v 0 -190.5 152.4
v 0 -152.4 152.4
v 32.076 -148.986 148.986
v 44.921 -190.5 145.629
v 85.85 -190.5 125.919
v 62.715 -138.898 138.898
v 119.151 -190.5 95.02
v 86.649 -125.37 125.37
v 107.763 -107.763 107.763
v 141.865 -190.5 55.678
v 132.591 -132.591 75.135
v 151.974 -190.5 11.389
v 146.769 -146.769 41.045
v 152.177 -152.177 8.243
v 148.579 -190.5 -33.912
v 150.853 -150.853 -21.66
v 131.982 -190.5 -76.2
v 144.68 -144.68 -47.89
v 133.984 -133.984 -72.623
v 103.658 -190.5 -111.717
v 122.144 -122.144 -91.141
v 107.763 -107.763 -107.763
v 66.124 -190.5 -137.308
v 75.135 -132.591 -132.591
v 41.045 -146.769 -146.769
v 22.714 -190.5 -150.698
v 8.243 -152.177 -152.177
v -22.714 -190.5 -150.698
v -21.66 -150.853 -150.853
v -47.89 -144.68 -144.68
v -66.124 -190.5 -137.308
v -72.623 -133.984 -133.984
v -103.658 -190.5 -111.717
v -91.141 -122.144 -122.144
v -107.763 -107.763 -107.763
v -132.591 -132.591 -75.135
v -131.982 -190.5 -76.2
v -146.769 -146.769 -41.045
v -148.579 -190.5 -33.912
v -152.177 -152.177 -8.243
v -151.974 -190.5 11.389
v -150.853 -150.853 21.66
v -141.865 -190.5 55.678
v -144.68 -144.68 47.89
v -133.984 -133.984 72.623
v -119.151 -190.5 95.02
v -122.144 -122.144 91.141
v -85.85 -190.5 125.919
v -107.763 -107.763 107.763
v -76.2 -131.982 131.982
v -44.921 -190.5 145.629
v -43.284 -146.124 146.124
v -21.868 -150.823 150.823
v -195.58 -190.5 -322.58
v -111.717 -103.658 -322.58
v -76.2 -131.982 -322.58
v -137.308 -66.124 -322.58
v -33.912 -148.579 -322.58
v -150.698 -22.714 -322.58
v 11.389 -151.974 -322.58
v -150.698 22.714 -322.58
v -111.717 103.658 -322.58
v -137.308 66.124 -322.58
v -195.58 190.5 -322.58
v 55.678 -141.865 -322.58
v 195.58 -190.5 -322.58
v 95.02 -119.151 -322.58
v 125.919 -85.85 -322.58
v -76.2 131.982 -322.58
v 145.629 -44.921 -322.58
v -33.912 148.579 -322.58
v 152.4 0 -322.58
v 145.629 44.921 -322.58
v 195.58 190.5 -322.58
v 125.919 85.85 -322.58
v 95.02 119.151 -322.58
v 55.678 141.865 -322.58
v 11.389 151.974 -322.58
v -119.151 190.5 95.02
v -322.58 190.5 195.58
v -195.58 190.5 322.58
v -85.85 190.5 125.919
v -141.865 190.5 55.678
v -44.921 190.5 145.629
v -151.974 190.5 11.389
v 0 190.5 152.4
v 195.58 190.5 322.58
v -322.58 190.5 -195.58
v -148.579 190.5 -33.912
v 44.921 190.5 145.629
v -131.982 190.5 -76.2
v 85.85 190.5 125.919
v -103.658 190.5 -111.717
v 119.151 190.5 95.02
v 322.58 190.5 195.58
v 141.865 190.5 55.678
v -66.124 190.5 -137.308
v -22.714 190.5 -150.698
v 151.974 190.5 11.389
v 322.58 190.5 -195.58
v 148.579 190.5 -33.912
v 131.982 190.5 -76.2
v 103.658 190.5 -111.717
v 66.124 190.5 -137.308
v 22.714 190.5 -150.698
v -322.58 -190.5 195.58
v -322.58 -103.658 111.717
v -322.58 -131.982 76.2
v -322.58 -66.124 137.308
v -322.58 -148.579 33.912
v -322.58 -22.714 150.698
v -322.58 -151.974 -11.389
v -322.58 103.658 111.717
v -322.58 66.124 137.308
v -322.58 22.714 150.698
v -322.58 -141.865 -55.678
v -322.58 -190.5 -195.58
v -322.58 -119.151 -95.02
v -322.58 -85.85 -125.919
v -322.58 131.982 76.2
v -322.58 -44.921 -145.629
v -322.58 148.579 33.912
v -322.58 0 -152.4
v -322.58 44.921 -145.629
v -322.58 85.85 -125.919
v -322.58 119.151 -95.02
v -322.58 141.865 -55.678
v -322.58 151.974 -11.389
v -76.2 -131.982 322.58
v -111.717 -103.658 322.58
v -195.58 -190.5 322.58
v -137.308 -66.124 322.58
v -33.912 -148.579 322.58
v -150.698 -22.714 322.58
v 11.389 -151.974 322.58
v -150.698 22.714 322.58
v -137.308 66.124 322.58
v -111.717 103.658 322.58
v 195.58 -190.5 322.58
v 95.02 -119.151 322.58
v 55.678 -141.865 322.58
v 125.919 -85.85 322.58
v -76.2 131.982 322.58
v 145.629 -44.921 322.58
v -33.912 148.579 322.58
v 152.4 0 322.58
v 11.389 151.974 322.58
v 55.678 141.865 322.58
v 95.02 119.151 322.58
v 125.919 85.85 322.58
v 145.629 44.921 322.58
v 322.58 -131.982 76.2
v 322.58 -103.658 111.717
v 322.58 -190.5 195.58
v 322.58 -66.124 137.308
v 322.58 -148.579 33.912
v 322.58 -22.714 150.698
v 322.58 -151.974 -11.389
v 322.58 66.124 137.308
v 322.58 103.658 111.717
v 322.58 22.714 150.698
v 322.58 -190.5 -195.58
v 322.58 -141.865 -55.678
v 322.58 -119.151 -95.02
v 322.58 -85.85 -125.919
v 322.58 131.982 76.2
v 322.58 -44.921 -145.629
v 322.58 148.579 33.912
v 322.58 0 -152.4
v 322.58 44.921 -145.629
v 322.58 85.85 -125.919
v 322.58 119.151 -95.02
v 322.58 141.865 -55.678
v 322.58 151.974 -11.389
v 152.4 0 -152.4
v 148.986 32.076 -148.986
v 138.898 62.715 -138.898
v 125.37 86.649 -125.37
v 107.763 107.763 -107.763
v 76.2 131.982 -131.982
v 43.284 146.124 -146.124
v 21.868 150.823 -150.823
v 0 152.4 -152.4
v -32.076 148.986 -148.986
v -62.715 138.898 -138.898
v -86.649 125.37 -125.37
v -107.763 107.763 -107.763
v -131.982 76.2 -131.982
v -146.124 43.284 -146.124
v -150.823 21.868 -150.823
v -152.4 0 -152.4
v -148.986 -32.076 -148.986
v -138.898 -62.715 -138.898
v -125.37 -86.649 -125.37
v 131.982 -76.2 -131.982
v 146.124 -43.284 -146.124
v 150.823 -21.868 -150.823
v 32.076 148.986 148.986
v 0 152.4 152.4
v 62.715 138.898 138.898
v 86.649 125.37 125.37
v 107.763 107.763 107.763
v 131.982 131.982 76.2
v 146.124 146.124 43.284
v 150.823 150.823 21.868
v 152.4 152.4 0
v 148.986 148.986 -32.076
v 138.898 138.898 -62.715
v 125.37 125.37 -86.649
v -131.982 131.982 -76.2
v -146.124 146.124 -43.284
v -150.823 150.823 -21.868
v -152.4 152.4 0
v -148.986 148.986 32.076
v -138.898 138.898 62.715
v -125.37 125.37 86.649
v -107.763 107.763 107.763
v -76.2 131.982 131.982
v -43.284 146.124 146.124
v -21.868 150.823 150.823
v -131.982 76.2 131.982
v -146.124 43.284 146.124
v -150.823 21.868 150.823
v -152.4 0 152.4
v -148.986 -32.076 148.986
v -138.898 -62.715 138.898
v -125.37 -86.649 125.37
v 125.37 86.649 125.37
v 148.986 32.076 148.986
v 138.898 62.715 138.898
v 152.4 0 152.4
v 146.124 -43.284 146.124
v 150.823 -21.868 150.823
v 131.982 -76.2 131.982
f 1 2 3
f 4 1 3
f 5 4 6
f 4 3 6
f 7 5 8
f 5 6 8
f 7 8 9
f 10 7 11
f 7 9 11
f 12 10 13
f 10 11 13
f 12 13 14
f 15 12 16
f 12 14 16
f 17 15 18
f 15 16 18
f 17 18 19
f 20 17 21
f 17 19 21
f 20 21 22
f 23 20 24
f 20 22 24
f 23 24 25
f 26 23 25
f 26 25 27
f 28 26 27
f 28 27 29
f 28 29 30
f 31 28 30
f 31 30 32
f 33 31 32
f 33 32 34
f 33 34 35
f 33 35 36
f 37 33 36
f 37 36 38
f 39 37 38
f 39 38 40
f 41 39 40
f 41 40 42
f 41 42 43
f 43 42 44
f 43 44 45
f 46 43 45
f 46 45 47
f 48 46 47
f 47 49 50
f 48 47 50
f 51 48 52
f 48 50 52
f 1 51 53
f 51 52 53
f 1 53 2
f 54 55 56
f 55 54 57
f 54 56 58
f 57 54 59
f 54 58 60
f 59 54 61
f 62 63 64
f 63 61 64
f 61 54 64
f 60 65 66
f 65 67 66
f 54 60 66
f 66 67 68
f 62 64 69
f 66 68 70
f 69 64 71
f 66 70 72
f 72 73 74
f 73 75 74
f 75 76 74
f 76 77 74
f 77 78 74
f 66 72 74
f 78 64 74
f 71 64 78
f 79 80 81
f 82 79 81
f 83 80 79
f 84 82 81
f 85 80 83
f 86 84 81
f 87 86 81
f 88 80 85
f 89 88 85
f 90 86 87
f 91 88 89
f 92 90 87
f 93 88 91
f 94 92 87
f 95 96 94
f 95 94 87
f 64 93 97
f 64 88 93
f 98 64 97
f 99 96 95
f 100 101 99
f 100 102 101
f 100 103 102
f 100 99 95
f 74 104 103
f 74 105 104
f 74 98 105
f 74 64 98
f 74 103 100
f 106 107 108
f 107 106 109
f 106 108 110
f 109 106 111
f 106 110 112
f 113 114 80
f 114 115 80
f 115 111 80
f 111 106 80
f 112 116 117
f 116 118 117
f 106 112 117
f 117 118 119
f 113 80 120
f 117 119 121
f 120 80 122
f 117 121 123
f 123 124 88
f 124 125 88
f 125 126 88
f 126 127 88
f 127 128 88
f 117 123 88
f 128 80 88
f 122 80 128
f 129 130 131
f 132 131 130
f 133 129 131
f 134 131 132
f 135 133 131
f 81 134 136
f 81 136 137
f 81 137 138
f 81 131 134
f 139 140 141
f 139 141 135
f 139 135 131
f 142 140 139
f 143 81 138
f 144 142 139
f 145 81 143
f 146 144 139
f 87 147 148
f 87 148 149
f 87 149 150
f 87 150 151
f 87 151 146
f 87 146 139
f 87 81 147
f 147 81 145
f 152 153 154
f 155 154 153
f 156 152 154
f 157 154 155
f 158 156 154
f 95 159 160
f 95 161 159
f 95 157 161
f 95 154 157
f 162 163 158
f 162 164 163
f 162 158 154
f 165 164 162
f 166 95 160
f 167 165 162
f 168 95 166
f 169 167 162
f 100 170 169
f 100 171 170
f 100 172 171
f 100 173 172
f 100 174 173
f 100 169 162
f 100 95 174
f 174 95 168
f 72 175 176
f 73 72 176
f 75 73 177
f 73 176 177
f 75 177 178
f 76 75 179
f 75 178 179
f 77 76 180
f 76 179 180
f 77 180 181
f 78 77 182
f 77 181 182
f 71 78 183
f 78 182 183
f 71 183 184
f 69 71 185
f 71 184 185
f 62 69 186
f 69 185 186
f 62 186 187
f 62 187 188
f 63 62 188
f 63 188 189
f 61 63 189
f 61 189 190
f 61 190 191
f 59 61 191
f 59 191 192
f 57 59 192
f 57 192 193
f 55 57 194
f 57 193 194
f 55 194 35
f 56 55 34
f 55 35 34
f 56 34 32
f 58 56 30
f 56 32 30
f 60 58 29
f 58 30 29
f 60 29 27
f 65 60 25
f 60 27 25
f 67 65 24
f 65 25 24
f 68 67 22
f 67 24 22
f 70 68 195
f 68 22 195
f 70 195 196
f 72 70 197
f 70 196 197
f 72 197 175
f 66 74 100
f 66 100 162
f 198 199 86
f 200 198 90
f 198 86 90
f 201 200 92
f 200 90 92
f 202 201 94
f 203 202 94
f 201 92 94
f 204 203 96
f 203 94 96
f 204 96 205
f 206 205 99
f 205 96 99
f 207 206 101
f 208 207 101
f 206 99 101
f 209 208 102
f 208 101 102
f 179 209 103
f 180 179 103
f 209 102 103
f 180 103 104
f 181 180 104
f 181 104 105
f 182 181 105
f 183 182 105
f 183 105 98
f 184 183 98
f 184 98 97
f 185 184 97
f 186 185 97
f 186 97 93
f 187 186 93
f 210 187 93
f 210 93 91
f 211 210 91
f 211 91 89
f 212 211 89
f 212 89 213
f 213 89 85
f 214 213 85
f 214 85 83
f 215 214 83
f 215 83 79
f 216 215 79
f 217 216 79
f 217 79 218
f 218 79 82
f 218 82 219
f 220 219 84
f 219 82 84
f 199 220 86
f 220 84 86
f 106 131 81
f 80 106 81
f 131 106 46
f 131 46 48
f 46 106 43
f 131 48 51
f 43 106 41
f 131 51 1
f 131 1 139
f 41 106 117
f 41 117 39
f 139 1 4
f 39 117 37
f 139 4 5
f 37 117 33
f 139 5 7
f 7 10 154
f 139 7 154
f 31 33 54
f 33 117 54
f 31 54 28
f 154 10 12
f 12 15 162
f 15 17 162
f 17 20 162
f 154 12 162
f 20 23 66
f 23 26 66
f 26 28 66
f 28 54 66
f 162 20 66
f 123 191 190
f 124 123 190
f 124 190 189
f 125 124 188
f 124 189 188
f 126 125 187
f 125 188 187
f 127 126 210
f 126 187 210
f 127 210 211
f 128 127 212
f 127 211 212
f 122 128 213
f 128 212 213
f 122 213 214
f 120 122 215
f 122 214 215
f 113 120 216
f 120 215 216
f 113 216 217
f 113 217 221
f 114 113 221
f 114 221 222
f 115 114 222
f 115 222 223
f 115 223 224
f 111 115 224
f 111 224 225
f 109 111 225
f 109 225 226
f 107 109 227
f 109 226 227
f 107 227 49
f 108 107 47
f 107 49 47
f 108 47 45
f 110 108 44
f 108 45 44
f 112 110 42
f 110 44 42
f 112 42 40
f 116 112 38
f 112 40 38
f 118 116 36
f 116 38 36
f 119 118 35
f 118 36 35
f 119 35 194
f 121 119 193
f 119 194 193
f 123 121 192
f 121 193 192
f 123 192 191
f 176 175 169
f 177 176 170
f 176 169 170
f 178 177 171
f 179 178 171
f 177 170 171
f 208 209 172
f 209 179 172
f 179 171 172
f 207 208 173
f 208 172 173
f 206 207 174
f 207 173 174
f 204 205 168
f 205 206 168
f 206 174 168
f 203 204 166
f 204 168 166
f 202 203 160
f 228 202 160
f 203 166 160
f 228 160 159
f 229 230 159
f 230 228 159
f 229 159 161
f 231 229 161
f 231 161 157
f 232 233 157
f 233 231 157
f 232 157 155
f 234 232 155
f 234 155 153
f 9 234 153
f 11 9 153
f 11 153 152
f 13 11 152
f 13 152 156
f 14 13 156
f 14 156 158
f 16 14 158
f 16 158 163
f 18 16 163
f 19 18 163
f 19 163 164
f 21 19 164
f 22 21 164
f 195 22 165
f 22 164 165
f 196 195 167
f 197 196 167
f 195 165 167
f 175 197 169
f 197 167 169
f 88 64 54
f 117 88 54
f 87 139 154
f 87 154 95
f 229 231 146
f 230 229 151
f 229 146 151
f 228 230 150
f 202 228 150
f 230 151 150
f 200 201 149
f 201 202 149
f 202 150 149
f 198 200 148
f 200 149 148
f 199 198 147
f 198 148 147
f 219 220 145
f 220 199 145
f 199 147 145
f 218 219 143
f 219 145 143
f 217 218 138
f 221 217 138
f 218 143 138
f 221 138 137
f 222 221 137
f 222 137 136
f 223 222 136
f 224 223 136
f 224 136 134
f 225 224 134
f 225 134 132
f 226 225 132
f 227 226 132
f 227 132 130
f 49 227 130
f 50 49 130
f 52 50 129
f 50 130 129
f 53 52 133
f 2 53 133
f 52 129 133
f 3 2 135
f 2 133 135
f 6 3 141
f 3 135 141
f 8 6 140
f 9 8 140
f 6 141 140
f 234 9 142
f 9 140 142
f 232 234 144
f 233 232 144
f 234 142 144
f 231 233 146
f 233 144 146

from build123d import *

# Parameters (mm, degrees)
SKETCH1_W           = 645.16
SKETCH1_H           = 645.16
BOSS_EXTRUDE1_DEPTH = 190.5
CHAMFER1_SIZE       = 127
SKETCH2_R           = 152.4
CUT_EXTRUDE1_DEPTH  = 595.370854602
SKETCH3_R           = 152.4
CUT_EXTRUDE2_DEPTH  = 747.042580554
CIRPATTERN1_COUNT   = 4


with BuildPart() as part:
    # Sketch1 → Boss-Extrude1 (new, symmetric)
    with BuildSketch(Plane(origin=(0, 0, 0), x_dir=(1, 0, 0), z_dir=(0, 1, 0))):
        Rectangle(SKETCH1_W, SKETCH1_H)
    extrude(amount=BOSS_EXTRUDE1_DEPTH, both=True)

    # Chamfer1
    chamfer1_edges = [part.edges().sort_by_distance(p)[0] for p in [
        (322.58, 0, 322.58),
        (-322.58, 0, 322.58),
        (-322.58, 0, -322.58),
        (322.58, 0, -322.58),
    ]]
    chamfer(chamfer1_edges, length=CHAMFER1_SIZE)

    # Sketch2 → Cut-Extrude1 (cut, through all)
    with BuildSketch(Plane(origin=(0, 190.5, 0), x_dir=(1, 0, 0), z_dir=(0, 1, 0))):
        with Locations(Location((0, 0, 0), (0, 0, 270))):
            Circle(SKETCH2_R)
    extrude(amount=-CUT_EXTRUDE1_DEPTH, mode=Mode.SUBTRACT)

    # Sketch3 → Cut-Extrude2 (cut, through all)
    with BuildSketch(Plane.XY.offset(322.58)):
        Circle(SKETCH3_R)
    cut_extrude2 = extrude(amount=-CUT_EXTRUDE2_DEPTH, mode=Mode.SUBTRACT)

    # CirPattern1: Cut-Extrude2 ×4 about axis
    cirpattern1_axis = Axis((0, -190.5, 0), (0, 1, 0))
    for i in range(1, CIRPATTERN1_COUNT):
        add(cut_extrude2.rotate(cirpattern1_axis, i * 360 / CIRPATTERN1_COUNT), mode=Mode.SUBTRACT)


solid = part.part
